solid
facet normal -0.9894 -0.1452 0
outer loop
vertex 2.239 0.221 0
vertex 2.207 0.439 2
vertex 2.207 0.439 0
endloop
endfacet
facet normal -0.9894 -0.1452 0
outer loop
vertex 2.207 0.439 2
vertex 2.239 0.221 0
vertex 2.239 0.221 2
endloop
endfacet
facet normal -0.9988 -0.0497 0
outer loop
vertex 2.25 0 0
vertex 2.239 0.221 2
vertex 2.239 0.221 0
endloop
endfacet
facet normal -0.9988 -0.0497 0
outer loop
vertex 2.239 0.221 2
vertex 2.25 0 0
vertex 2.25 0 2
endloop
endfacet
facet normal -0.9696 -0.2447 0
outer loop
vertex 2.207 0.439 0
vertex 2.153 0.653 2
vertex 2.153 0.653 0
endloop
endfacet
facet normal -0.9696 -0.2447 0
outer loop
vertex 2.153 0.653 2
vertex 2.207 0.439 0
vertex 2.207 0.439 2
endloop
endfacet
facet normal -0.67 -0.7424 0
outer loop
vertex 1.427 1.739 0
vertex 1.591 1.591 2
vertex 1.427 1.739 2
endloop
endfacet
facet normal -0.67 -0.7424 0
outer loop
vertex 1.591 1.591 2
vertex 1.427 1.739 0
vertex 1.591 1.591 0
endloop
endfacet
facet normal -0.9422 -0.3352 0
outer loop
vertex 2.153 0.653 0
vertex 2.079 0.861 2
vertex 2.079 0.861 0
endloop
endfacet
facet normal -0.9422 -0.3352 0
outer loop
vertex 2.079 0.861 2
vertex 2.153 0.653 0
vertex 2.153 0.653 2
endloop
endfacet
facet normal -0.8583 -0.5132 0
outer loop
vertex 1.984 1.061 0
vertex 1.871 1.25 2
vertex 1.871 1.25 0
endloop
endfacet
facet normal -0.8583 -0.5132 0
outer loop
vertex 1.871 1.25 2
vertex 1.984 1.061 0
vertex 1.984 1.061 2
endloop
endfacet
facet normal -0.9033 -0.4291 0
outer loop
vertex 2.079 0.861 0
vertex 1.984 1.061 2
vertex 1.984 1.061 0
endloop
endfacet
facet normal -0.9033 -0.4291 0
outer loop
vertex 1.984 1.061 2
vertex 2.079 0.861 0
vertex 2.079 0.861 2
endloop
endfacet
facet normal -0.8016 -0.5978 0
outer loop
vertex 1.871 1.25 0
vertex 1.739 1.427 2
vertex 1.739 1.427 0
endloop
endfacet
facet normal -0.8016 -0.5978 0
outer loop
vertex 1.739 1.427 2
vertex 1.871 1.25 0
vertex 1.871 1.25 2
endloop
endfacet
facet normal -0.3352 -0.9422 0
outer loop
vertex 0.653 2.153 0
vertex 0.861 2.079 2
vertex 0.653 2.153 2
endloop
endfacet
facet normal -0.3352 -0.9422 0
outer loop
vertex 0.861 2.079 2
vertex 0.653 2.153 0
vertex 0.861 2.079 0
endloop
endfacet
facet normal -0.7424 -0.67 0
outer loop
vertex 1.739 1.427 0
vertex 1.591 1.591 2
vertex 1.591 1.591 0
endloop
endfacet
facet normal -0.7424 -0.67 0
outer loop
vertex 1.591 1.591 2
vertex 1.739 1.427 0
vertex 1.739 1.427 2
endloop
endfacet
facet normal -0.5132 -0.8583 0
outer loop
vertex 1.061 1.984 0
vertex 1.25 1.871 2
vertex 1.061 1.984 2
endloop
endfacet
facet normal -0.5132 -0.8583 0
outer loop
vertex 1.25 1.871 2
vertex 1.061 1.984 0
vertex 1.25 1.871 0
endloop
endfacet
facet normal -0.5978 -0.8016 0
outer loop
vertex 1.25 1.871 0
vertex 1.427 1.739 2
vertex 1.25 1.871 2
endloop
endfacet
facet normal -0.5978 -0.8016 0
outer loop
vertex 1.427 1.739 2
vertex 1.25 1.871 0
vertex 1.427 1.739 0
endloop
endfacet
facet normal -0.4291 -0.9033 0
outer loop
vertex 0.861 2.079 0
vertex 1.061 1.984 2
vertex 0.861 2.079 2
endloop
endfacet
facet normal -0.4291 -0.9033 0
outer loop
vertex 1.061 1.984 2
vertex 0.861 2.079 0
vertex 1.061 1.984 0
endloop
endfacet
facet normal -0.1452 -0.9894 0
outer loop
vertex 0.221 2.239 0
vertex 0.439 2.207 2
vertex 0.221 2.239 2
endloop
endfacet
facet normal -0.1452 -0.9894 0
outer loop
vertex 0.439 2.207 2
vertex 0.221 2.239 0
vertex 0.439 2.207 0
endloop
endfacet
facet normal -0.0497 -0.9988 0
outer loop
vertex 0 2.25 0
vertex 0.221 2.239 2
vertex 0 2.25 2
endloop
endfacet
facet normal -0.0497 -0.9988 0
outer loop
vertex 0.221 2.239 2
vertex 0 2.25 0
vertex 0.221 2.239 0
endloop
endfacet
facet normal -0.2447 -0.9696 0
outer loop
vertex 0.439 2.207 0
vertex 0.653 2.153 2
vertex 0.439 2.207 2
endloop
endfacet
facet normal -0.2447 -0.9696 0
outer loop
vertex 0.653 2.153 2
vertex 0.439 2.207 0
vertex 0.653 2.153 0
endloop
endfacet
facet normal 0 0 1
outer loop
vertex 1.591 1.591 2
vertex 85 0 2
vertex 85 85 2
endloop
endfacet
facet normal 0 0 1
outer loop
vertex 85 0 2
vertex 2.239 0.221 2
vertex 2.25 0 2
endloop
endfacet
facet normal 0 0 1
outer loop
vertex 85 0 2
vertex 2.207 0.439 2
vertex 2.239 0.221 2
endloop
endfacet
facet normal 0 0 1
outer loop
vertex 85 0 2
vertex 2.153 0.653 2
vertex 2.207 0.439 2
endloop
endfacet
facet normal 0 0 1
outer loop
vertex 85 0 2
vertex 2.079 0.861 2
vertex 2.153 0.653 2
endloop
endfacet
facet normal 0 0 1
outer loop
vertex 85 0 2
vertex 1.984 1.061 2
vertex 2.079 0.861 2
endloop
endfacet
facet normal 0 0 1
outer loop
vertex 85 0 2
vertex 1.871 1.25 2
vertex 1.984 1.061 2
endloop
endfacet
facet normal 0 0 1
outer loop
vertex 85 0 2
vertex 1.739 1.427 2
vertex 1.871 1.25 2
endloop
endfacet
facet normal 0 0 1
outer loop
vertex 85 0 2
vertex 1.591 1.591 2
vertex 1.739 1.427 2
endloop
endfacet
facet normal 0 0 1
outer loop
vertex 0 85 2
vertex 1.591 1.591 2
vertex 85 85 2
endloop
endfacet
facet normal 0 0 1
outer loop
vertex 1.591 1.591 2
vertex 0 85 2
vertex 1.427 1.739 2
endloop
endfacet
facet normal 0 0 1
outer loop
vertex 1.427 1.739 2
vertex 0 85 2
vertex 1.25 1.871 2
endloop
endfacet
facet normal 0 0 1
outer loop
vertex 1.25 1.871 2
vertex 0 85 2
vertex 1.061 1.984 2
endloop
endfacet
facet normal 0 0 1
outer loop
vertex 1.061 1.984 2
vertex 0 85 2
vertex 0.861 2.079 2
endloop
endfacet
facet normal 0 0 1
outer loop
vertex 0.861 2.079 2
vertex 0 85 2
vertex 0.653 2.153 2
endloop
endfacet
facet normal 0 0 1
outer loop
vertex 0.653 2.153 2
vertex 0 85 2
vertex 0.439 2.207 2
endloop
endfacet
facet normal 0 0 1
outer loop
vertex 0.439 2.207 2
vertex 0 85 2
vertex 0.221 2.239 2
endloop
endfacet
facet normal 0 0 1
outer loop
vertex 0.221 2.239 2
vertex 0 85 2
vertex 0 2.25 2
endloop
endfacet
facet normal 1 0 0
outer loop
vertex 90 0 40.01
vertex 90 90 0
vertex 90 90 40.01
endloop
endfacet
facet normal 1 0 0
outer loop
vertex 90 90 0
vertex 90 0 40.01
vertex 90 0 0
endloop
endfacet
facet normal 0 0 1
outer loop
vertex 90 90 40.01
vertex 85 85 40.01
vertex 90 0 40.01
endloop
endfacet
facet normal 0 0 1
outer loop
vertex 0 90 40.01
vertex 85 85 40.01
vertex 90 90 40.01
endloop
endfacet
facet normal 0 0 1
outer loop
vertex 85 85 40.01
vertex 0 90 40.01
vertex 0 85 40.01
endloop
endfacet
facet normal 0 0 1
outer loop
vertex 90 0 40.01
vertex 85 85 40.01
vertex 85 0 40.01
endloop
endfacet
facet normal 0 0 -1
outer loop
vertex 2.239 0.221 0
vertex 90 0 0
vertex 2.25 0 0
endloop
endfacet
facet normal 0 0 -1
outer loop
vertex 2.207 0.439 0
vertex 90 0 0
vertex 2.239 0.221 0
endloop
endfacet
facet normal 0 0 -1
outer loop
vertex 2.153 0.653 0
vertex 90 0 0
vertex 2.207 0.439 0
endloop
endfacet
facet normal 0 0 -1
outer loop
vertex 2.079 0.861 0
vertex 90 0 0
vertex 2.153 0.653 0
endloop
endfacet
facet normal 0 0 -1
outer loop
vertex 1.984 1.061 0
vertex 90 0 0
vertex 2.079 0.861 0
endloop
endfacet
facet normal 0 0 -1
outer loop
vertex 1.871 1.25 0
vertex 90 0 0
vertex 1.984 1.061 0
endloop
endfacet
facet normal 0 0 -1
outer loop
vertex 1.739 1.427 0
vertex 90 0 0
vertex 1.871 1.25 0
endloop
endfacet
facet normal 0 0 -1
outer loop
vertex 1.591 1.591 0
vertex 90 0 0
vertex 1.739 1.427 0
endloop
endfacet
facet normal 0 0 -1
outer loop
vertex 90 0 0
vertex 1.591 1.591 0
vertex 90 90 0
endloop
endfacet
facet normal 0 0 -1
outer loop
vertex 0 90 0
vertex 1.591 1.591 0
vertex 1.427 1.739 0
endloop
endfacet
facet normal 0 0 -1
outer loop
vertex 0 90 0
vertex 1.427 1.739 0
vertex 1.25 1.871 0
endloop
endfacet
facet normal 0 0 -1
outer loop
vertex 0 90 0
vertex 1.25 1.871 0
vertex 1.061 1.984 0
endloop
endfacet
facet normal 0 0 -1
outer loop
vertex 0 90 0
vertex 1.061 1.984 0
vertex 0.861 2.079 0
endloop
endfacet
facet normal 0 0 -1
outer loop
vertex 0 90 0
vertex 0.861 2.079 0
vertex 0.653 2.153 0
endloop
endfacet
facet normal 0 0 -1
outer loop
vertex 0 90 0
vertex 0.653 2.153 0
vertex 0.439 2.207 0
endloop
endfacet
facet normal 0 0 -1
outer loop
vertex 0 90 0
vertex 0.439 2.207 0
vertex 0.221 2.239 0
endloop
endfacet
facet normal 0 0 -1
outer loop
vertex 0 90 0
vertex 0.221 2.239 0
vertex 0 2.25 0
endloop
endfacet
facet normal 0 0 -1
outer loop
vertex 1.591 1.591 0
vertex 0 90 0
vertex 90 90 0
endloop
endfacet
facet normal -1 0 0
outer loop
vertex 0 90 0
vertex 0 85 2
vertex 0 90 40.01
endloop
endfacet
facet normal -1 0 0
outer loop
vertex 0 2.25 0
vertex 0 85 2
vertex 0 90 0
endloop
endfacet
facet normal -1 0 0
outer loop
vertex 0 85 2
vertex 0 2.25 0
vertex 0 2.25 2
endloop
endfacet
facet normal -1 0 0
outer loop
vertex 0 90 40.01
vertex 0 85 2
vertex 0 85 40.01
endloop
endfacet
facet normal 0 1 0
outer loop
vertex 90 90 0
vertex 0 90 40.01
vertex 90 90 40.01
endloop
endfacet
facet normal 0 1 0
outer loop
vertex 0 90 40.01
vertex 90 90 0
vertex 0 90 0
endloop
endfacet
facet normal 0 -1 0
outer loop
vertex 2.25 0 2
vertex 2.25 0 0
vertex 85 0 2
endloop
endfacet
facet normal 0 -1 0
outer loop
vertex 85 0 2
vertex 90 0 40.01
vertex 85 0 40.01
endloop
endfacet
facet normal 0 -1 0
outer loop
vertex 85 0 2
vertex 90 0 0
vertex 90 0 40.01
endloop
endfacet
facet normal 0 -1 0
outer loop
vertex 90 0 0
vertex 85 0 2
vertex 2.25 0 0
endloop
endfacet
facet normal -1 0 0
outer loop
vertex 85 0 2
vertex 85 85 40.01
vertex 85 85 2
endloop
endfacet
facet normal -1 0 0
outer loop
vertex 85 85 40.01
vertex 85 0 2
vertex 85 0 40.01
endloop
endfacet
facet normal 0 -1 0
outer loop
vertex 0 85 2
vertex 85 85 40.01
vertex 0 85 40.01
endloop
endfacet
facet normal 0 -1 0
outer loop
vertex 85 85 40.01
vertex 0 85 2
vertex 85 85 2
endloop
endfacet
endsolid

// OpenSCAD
// DIY Magnetic Stirrer Housing - based on an 80mm PC fan.
// Orientation: Top plate on bed (z=0), walls rising to z=40.
// Outer dimensions: 90 x 90 mm.

$fn = 64;

// Dimensions
outer_w = 90;
outer_h = 90;
top_thk = 2;
wall_thk = 2.5;
wall_h   = 40; // Total height from bed to open top
notch_w  = 12;
notch_d  = 8;  // Depth from open edge (z=40) down to z=32

// Fan mounting hole pattern
mounting_sq = 71.5;
mounting_hole = 4.5;

// Derived positions
half_outer = outer_w / 2;
half_mount = mounting_sq / 2;
z_open     = wall_h; // The open top is at z = 40

difference() {
    // 1. The main solid block (Top plate + Walls)
    // Outer box: 90x90x40
    translate([0, 0, 0]) 
        cube([outer_w, outer_h, wall_h + 0.01]); // +0.01 to ensure solid union

    // 2. Cut the internal cavity
    // Cavity starts at z = top_thk and goes up to z_open
    // Inner dimensions: (90 - 2*2.5) x (90 - 2*2.5) = 85 x 85
    translate([0, 0, top_thk]) 
        cube([outer_w - 2*wall_thk, outer_h - 2*wall_thk, wall_h - top_thk + 0.01]);

    // 3. Screw holes in the top plate
    // Pattern: 71.5 mm square centred on the plate.
    // Corners at: +/- 35.75, +/- 35.75
    for (i = [0 : 3]) {
        x_pos = 0;
        y_pos = 0;
        if (i == 0) {
            x_pos = -half_mount;
            y_pos = -half_mount;
        } else if (i == 1) {
            x_pos = -half_mount;
            y_pos = half_mount;
        } else if (i == 2) {
            x_pos = half_mount;
            y_pos = half_mount;
        } else {
            x_pos = half_mount;
            y_pos = -half_mount;
        }
        
        translate([x_pos, y_pos, 0]) {
            // Cut through the top plate only (z=0 to z=top_thk)
            // Extend slightly below z=0 to ensure clean cut
            translate([0, 0, -1]) 
                cylinder(h = top_thk + 1, d = mounting_hole);
        }
    }

    // 4. Cable notch in one wall (Front wall, facing +Y)
    // Position: Centred along the wall (x=0), on the inner face (y = half_outer - wall_thk/2)
    // The notch cuts through the entire wall thickness in Y.
    translate([0, half_outer - wall_thk/2, 0]) {
        translate([0, 0, 32]) 
            cube([notch_w, wall_thk, notch_d + 0.01]);
    }
}
